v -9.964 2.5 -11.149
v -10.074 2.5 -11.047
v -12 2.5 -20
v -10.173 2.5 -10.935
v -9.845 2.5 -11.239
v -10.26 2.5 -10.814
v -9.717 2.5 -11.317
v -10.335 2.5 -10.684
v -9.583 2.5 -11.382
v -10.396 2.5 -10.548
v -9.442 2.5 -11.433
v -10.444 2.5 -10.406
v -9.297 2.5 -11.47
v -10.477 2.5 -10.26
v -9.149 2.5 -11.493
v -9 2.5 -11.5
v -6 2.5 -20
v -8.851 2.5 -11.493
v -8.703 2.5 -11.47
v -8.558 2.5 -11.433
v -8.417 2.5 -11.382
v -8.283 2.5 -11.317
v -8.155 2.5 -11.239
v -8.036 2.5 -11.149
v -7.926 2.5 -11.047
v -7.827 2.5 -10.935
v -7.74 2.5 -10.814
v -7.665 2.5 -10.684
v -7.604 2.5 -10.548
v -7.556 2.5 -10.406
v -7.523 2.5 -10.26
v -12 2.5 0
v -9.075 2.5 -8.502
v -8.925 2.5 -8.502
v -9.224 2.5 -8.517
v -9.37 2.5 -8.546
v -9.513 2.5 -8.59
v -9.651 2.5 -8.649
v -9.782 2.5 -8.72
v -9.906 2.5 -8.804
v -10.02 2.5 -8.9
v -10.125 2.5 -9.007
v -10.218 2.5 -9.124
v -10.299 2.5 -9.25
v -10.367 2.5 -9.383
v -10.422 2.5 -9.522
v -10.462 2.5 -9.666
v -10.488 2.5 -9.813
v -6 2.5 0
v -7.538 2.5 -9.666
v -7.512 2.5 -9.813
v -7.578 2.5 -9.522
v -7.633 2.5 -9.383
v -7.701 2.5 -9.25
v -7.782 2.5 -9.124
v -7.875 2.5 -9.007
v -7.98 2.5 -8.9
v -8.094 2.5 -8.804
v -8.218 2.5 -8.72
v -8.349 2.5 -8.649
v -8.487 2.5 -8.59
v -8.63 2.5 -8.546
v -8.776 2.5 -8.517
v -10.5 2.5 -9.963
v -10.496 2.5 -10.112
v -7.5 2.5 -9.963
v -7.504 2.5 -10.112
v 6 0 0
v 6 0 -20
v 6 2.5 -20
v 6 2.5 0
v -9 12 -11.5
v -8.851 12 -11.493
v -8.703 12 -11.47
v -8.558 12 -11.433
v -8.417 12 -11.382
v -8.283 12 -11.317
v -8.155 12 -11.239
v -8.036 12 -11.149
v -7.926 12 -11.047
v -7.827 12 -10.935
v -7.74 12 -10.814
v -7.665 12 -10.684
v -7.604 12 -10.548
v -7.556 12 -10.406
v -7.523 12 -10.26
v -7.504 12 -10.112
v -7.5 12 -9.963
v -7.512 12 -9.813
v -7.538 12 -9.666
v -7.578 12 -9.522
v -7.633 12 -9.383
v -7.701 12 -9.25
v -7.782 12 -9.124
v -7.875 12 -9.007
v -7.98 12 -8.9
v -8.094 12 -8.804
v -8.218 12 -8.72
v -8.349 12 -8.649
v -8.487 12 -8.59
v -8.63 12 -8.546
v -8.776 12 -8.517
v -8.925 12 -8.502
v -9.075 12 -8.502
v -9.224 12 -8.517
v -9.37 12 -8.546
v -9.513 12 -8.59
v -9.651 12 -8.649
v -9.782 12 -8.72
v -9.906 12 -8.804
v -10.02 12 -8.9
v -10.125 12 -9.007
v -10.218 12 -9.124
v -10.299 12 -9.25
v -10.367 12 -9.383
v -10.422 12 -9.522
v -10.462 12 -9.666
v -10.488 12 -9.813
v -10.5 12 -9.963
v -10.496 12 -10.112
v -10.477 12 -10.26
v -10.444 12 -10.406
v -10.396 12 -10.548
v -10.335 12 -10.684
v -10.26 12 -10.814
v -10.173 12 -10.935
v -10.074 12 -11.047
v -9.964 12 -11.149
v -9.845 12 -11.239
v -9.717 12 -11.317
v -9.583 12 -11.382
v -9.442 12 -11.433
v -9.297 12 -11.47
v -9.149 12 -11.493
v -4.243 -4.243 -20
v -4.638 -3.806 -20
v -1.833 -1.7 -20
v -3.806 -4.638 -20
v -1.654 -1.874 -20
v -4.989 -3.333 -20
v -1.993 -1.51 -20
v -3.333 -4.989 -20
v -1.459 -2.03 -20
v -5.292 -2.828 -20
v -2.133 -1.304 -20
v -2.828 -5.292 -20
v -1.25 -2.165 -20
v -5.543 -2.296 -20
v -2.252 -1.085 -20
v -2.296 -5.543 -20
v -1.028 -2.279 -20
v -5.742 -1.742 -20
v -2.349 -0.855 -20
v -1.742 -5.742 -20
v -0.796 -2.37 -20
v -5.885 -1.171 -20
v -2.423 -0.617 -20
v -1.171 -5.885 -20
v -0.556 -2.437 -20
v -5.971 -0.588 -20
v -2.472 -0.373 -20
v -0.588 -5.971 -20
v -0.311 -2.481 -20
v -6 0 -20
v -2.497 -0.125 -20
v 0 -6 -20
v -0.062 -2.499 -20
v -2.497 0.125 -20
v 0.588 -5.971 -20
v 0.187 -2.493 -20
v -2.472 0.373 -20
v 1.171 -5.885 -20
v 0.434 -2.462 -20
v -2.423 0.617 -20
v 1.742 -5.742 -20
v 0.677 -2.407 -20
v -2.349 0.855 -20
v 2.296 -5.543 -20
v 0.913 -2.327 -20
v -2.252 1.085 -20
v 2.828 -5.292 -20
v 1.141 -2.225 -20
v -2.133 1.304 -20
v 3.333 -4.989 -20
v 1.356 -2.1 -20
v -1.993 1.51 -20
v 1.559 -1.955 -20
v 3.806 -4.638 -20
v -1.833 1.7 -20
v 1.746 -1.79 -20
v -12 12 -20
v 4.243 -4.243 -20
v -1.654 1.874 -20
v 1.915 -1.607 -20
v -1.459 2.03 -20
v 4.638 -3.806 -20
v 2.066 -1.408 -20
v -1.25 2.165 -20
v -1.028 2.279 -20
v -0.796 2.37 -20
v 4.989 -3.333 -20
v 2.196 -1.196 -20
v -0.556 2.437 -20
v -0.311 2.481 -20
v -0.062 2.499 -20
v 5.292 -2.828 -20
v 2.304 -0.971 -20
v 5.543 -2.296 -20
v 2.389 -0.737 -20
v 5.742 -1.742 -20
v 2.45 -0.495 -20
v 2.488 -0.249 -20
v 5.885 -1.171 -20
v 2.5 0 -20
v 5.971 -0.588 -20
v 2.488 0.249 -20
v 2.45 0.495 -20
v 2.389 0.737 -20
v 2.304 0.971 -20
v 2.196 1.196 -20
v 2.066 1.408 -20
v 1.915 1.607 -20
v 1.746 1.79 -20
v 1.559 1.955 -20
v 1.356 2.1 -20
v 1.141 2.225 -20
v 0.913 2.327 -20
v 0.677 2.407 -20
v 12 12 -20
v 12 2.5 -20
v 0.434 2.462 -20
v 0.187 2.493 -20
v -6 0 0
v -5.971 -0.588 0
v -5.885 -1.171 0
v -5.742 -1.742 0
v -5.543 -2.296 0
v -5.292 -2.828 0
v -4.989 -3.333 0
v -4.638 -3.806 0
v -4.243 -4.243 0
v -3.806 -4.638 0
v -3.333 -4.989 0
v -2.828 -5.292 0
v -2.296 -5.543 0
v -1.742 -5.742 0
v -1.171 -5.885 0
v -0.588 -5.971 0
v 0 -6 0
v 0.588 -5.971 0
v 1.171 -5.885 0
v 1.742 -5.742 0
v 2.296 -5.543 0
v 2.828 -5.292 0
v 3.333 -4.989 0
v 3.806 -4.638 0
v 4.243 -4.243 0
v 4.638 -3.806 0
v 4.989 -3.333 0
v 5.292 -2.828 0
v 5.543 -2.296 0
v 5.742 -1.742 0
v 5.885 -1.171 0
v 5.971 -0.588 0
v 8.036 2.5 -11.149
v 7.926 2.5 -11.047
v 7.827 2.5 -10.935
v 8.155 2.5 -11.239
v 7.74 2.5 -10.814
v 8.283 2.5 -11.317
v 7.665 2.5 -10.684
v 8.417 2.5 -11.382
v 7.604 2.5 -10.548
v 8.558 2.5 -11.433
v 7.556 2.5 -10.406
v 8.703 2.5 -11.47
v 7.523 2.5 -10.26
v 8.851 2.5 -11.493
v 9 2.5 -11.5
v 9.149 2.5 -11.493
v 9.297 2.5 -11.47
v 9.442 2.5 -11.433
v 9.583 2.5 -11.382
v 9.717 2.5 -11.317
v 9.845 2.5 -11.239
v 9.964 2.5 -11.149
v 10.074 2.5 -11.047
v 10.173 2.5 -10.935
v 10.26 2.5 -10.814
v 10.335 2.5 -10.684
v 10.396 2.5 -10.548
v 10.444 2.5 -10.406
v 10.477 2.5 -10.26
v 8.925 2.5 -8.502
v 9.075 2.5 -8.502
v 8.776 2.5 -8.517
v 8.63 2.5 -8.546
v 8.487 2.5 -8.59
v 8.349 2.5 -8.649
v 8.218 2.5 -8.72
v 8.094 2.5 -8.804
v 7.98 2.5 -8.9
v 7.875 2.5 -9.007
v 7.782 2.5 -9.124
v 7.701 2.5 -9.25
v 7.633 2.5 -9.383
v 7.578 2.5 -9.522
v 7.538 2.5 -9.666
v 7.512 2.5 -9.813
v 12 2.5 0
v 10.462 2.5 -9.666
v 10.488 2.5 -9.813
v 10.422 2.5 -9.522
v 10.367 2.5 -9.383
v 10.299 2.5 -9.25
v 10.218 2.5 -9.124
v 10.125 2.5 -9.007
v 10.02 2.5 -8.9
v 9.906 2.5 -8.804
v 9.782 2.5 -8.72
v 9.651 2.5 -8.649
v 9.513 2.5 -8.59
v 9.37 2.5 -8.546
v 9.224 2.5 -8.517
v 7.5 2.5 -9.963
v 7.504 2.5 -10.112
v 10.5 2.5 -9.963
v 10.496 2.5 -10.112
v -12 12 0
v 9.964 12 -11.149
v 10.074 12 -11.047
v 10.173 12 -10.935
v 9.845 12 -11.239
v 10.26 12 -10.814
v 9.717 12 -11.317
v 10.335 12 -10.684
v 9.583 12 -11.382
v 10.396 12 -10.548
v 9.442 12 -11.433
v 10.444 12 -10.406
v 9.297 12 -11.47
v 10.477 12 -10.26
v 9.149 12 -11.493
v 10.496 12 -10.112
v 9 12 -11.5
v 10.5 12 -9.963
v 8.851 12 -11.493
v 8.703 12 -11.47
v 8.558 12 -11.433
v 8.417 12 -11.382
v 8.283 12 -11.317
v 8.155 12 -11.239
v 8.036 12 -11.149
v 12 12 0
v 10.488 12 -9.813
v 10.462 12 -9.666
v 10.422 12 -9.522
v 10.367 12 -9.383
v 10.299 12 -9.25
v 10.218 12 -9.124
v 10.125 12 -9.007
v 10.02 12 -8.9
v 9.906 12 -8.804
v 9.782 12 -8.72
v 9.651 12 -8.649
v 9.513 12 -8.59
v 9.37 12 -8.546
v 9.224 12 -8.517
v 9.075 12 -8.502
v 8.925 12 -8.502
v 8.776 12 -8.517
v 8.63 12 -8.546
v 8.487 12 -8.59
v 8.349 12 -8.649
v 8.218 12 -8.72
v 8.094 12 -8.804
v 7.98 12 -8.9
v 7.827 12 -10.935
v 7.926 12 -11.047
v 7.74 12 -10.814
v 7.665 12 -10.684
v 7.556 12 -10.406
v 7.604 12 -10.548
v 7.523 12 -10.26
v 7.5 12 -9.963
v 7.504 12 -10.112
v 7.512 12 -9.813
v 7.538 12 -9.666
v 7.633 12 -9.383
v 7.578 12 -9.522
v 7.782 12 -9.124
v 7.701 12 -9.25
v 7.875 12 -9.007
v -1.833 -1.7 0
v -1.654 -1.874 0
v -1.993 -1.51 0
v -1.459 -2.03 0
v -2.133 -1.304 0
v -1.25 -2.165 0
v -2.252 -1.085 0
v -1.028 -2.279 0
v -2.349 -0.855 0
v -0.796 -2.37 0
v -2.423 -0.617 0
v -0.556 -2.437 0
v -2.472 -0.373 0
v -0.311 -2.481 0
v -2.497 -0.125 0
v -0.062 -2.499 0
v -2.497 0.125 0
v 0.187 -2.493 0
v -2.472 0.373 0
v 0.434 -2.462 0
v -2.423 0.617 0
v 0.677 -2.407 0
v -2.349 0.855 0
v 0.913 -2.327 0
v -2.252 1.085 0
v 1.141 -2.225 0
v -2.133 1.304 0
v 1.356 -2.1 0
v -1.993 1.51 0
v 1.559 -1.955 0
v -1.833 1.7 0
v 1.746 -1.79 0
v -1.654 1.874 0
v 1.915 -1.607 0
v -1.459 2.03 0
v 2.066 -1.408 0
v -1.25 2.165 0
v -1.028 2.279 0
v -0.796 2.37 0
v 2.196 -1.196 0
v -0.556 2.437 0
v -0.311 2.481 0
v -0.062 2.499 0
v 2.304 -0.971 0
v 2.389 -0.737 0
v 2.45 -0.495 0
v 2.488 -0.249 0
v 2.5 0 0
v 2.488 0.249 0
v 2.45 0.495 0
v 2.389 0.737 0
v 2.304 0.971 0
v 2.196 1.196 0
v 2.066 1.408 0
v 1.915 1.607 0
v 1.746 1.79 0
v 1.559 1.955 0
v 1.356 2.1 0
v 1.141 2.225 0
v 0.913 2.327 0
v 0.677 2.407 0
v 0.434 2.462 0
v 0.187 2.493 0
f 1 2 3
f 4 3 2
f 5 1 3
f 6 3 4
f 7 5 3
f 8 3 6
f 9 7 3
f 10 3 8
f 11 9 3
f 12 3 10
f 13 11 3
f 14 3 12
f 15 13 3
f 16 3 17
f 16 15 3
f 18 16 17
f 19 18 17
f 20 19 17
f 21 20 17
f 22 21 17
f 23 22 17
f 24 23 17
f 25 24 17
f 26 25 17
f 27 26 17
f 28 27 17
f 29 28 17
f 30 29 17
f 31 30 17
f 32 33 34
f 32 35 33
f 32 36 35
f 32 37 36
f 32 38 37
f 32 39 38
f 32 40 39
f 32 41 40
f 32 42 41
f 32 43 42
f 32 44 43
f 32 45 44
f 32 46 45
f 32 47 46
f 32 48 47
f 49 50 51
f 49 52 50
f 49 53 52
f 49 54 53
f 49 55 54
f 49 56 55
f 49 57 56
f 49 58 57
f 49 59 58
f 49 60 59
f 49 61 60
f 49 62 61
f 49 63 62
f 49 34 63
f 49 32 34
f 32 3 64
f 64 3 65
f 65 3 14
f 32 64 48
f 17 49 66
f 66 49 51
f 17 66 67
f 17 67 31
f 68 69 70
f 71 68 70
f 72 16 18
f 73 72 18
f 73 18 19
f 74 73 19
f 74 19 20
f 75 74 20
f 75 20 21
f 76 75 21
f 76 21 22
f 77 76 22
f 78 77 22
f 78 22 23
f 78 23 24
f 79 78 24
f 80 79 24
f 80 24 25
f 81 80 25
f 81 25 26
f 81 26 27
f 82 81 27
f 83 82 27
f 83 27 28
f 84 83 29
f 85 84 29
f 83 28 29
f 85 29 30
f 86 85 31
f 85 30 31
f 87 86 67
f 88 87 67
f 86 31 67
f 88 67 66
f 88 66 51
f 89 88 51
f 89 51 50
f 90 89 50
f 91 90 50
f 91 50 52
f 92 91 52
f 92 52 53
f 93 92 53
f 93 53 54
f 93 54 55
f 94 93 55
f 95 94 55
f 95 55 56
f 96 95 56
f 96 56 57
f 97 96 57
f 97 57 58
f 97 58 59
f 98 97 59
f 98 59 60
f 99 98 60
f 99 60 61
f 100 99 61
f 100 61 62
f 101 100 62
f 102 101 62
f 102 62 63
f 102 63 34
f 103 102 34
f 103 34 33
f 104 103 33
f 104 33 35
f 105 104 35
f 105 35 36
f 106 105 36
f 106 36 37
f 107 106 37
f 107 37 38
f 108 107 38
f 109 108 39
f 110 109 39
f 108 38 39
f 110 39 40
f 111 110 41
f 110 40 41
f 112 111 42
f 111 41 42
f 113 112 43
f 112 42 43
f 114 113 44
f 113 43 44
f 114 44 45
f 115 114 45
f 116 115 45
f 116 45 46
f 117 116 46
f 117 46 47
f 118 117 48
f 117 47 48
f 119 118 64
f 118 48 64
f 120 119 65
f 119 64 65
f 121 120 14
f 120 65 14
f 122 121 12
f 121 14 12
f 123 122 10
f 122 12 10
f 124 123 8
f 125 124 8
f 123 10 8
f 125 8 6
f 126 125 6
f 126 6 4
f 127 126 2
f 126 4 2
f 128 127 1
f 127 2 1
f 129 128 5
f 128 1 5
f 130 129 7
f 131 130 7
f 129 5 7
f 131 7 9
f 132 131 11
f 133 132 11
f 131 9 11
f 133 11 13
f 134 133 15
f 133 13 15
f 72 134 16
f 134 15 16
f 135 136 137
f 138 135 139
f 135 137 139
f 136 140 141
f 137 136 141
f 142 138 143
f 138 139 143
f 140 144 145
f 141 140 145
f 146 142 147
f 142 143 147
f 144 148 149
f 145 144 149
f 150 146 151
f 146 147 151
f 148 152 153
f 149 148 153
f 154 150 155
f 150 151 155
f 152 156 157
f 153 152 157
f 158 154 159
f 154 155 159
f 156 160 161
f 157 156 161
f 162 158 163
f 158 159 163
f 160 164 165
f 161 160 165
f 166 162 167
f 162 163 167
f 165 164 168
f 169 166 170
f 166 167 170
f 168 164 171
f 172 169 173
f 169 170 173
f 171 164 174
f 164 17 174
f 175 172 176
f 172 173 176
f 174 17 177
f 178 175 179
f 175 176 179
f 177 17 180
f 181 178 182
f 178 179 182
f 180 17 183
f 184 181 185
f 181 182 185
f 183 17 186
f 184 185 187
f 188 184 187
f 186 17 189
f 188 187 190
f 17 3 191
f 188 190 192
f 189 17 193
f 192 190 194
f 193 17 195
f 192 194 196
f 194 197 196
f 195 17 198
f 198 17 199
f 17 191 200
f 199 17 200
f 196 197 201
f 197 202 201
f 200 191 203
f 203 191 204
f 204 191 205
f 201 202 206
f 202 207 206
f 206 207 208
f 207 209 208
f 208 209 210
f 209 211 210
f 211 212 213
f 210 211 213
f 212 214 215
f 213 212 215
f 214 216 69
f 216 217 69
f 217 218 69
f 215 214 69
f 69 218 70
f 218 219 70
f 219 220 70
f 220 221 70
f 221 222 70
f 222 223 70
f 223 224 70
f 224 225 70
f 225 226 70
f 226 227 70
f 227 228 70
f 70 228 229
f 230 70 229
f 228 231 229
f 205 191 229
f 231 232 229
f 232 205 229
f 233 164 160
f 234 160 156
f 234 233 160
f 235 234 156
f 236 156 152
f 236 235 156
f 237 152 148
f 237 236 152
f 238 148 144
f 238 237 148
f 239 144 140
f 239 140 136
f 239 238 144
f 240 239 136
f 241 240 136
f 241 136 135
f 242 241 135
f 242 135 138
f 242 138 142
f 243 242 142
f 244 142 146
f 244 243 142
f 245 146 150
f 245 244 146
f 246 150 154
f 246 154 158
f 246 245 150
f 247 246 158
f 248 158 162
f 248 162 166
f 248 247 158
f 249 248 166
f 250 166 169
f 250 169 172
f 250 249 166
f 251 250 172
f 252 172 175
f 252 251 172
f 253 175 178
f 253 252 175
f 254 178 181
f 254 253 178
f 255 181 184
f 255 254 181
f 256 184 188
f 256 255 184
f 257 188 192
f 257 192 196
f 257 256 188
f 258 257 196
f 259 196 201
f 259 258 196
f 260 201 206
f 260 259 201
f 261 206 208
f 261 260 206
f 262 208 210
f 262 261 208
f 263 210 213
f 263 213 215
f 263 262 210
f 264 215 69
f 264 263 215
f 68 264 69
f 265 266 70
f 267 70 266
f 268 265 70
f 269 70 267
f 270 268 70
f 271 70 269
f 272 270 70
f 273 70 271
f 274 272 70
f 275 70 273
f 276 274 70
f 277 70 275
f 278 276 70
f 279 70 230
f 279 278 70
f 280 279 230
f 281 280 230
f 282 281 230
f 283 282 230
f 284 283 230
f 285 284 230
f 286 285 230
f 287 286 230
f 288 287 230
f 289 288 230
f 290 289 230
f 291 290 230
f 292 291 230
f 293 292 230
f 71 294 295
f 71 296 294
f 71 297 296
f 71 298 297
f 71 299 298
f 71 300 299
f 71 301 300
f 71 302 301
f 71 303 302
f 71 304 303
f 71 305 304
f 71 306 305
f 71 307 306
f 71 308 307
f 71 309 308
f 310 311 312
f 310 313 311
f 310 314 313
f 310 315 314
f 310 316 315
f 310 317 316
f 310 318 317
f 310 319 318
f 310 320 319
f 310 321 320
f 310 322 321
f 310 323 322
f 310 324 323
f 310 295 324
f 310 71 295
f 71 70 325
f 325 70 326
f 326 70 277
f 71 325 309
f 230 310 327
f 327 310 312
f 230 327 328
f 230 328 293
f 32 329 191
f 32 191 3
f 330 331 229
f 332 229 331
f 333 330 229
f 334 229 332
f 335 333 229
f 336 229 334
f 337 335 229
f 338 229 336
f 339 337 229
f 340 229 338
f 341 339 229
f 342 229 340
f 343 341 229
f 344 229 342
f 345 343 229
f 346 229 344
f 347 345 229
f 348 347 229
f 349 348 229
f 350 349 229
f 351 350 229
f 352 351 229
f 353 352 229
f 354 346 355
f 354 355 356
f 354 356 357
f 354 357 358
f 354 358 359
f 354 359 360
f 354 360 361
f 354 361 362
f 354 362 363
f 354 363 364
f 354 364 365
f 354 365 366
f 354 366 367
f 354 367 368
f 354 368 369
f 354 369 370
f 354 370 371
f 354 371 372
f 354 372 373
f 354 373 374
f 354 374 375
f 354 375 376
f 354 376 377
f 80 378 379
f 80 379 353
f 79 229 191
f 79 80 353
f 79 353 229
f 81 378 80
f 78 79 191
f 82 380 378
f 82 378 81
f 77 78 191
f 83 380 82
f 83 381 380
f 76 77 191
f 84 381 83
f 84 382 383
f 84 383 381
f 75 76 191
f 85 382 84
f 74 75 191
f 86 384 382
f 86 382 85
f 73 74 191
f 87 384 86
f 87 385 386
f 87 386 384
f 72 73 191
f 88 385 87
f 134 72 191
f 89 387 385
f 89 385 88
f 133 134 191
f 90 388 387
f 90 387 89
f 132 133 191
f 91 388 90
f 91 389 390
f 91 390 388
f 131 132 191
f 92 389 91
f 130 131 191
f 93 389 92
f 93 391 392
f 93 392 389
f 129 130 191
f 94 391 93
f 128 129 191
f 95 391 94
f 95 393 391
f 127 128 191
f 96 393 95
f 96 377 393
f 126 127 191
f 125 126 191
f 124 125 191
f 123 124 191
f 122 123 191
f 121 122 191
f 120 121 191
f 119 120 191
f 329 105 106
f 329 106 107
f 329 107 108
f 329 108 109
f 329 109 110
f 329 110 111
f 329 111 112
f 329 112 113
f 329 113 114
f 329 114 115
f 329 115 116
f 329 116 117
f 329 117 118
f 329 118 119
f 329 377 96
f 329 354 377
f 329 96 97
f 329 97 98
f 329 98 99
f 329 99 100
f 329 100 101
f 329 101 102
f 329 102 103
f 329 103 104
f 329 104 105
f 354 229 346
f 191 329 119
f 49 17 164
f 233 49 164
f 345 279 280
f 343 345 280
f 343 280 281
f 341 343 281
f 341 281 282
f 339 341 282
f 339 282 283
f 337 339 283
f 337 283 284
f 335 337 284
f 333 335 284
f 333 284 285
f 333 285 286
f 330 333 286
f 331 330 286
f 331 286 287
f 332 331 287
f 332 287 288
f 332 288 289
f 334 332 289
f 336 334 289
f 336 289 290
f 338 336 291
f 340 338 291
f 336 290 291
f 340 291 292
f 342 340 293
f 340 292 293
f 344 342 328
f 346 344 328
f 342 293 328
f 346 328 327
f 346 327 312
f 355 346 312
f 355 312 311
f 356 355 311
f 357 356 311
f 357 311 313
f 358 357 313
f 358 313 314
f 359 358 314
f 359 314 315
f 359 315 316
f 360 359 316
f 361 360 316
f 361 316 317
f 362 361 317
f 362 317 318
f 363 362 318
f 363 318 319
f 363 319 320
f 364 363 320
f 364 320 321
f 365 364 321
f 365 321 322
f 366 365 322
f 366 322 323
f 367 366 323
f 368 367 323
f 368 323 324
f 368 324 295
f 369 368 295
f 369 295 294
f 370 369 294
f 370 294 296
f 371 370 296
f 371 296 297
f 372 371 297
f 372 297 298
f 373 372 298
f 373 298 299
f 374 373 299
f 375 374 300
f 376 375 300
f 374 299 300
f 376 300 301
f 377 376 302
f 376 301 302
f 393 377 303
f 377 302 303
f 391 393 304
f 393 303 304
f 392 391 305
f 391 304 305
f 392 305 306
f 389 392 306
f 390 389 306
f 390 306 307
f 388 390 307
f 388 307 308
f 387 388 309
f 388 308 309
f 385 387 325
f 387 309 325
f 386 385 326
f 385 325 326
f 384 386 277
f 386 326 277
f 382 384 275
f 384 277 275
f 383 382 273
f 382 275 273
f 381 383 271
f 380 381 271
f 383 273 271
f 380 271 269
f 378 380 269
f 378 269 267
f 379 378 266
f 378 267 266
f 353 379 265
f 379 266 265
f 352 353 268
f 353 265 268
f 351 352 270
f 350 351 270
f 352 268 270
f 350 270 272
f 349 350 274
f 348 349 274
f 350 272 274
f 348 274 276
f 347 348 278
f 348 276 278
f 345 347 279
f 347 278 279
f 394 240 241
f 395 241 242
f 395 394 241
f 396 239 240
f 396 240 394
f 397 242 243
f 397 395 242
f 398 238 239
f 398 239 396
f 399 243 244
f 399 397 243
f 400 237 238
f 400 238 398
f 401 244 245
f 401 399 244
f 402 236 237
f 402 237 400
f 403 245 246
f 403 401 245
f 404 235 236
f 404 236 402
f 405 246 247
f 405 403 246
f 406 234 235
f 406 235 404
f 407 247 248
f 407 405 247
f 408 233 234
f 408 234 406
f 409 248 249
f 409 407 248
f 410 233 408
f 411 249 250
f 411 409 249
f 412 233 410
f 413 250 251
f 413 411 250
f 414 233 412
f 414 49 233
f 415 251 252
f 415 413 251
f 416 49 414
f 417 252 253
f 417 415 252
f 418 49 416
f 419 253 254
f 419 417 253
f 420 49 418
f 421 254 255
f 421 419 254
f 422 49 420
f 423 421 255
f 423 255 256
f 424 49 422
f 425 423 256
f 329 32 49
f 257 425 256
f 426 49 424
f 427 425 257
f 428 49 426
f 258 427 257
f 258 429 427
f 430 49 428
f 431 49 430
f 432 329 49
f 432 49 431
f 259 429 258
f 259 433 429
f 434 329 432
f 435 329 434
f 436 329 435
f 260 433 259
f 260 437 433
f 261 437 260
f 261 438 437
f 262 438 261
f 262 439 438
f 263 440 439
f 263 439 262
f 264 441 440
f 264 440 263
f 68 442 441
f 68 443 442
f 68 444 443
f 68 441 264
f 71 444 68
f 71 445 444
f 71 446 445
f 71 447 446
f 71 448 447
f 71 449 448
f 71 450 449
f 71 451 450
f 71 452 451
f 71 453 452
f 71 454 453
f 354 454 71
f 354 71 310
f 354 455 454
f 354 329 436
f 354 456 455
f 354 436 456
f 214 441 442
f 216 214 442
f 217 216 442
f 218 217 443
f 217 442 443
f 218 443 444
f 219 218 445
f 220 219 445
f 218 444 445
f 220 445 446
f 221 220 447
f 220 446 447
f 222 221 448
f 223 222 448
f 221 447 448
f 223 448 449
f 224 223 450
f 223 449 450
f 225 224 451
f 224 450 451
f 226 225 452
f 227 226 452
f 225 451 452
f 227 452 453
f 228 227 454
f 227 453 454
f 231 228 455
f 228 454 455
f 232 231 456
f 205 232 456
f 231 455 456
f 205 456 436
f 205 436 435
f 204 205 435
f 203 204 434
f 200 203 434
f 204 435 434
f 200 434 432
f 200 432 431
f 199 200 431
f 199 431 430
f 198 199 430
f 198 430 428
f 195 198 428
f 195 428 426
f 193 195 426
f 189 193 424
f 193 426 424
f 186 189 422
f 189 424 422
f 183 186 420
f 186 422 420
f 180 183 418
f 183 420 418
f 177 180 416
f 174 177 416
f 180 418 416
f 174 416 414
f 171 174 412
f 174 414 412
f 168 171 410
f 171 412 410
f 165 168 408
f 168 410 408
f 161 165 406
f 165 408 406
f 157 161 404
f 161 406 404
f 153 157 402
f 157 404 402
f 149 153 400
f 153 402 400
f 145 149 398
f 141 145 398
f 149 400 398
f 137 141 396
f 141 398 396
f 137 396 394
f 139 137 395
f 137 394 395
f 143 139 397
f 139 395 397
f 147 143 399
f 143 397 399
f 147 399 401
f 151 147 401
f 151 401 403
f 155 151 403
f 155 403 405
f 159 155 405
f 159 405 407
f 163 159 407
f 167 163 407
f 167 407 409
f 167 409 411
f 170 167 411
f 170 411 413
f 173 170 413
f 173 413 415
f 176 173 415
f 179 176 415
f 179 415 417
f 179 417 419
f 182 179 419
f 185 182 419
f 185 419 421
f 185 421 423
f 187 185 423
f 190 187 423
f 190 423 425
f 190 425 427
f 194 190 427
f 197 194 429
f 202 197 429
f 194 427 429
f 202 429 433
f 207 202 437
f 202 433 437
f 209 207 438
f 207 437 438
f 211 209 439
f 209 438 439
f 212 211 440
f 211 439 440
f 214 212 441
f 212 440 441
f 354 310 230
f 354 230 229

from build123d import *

# Parameters (mm, degrees)
ESQUISSE1_R             = 2.5
BOSS_EXTRU_1_DEPTH      = 20
ESQUISSE2_R             = 1.5
ENL_V_MAT_EXTRU_1_DEPTH = 10


with BuildPart() as part:
    # Esquisse1 → Boss.-Extru.1 (new body)
    with BuildSketch(Plane.XY):
        with BuildLine():
            ThreePointArc((-6, 0), (0, -6), (6, 0))
            Line((6, 0), (6, 2.5))
            Line((6, 2.5), (12, 2.5))
            Line((12, 2.5), (12, 12))
            Line((12, 12), (-12, 12))
            Line((-12, 12), (-12, 2.5))
            Line((-12, 2.5), (-6, 2.5))
            Line((-6, 2.5), (-6, 0))
        make_face()
        Circle(ESQUISSE1_R, mode=Mode.SUBTRACT)
    extrude(amount=-BOSS_EXTRU_1_DEPTH)

    # Esquisse2 → Enlèv. mat.-Extru.1 (cut)
    with BuildSketch(Plane.XZ.offset(-2.5)):
        with Locations(Location((-9, -10, 0), (0, 0, 270))):
            Circle(ESQUISSE2_R)
        with Locations(Location((9, -10, 0), (0, 0, 270))):
            Circle(ESQUISSE2_R)
    extrude(amount=-ENL_V_MAT_EXTRU_1_DEPTH, mode=Mode.SUBTRACT)


solid = part.part
